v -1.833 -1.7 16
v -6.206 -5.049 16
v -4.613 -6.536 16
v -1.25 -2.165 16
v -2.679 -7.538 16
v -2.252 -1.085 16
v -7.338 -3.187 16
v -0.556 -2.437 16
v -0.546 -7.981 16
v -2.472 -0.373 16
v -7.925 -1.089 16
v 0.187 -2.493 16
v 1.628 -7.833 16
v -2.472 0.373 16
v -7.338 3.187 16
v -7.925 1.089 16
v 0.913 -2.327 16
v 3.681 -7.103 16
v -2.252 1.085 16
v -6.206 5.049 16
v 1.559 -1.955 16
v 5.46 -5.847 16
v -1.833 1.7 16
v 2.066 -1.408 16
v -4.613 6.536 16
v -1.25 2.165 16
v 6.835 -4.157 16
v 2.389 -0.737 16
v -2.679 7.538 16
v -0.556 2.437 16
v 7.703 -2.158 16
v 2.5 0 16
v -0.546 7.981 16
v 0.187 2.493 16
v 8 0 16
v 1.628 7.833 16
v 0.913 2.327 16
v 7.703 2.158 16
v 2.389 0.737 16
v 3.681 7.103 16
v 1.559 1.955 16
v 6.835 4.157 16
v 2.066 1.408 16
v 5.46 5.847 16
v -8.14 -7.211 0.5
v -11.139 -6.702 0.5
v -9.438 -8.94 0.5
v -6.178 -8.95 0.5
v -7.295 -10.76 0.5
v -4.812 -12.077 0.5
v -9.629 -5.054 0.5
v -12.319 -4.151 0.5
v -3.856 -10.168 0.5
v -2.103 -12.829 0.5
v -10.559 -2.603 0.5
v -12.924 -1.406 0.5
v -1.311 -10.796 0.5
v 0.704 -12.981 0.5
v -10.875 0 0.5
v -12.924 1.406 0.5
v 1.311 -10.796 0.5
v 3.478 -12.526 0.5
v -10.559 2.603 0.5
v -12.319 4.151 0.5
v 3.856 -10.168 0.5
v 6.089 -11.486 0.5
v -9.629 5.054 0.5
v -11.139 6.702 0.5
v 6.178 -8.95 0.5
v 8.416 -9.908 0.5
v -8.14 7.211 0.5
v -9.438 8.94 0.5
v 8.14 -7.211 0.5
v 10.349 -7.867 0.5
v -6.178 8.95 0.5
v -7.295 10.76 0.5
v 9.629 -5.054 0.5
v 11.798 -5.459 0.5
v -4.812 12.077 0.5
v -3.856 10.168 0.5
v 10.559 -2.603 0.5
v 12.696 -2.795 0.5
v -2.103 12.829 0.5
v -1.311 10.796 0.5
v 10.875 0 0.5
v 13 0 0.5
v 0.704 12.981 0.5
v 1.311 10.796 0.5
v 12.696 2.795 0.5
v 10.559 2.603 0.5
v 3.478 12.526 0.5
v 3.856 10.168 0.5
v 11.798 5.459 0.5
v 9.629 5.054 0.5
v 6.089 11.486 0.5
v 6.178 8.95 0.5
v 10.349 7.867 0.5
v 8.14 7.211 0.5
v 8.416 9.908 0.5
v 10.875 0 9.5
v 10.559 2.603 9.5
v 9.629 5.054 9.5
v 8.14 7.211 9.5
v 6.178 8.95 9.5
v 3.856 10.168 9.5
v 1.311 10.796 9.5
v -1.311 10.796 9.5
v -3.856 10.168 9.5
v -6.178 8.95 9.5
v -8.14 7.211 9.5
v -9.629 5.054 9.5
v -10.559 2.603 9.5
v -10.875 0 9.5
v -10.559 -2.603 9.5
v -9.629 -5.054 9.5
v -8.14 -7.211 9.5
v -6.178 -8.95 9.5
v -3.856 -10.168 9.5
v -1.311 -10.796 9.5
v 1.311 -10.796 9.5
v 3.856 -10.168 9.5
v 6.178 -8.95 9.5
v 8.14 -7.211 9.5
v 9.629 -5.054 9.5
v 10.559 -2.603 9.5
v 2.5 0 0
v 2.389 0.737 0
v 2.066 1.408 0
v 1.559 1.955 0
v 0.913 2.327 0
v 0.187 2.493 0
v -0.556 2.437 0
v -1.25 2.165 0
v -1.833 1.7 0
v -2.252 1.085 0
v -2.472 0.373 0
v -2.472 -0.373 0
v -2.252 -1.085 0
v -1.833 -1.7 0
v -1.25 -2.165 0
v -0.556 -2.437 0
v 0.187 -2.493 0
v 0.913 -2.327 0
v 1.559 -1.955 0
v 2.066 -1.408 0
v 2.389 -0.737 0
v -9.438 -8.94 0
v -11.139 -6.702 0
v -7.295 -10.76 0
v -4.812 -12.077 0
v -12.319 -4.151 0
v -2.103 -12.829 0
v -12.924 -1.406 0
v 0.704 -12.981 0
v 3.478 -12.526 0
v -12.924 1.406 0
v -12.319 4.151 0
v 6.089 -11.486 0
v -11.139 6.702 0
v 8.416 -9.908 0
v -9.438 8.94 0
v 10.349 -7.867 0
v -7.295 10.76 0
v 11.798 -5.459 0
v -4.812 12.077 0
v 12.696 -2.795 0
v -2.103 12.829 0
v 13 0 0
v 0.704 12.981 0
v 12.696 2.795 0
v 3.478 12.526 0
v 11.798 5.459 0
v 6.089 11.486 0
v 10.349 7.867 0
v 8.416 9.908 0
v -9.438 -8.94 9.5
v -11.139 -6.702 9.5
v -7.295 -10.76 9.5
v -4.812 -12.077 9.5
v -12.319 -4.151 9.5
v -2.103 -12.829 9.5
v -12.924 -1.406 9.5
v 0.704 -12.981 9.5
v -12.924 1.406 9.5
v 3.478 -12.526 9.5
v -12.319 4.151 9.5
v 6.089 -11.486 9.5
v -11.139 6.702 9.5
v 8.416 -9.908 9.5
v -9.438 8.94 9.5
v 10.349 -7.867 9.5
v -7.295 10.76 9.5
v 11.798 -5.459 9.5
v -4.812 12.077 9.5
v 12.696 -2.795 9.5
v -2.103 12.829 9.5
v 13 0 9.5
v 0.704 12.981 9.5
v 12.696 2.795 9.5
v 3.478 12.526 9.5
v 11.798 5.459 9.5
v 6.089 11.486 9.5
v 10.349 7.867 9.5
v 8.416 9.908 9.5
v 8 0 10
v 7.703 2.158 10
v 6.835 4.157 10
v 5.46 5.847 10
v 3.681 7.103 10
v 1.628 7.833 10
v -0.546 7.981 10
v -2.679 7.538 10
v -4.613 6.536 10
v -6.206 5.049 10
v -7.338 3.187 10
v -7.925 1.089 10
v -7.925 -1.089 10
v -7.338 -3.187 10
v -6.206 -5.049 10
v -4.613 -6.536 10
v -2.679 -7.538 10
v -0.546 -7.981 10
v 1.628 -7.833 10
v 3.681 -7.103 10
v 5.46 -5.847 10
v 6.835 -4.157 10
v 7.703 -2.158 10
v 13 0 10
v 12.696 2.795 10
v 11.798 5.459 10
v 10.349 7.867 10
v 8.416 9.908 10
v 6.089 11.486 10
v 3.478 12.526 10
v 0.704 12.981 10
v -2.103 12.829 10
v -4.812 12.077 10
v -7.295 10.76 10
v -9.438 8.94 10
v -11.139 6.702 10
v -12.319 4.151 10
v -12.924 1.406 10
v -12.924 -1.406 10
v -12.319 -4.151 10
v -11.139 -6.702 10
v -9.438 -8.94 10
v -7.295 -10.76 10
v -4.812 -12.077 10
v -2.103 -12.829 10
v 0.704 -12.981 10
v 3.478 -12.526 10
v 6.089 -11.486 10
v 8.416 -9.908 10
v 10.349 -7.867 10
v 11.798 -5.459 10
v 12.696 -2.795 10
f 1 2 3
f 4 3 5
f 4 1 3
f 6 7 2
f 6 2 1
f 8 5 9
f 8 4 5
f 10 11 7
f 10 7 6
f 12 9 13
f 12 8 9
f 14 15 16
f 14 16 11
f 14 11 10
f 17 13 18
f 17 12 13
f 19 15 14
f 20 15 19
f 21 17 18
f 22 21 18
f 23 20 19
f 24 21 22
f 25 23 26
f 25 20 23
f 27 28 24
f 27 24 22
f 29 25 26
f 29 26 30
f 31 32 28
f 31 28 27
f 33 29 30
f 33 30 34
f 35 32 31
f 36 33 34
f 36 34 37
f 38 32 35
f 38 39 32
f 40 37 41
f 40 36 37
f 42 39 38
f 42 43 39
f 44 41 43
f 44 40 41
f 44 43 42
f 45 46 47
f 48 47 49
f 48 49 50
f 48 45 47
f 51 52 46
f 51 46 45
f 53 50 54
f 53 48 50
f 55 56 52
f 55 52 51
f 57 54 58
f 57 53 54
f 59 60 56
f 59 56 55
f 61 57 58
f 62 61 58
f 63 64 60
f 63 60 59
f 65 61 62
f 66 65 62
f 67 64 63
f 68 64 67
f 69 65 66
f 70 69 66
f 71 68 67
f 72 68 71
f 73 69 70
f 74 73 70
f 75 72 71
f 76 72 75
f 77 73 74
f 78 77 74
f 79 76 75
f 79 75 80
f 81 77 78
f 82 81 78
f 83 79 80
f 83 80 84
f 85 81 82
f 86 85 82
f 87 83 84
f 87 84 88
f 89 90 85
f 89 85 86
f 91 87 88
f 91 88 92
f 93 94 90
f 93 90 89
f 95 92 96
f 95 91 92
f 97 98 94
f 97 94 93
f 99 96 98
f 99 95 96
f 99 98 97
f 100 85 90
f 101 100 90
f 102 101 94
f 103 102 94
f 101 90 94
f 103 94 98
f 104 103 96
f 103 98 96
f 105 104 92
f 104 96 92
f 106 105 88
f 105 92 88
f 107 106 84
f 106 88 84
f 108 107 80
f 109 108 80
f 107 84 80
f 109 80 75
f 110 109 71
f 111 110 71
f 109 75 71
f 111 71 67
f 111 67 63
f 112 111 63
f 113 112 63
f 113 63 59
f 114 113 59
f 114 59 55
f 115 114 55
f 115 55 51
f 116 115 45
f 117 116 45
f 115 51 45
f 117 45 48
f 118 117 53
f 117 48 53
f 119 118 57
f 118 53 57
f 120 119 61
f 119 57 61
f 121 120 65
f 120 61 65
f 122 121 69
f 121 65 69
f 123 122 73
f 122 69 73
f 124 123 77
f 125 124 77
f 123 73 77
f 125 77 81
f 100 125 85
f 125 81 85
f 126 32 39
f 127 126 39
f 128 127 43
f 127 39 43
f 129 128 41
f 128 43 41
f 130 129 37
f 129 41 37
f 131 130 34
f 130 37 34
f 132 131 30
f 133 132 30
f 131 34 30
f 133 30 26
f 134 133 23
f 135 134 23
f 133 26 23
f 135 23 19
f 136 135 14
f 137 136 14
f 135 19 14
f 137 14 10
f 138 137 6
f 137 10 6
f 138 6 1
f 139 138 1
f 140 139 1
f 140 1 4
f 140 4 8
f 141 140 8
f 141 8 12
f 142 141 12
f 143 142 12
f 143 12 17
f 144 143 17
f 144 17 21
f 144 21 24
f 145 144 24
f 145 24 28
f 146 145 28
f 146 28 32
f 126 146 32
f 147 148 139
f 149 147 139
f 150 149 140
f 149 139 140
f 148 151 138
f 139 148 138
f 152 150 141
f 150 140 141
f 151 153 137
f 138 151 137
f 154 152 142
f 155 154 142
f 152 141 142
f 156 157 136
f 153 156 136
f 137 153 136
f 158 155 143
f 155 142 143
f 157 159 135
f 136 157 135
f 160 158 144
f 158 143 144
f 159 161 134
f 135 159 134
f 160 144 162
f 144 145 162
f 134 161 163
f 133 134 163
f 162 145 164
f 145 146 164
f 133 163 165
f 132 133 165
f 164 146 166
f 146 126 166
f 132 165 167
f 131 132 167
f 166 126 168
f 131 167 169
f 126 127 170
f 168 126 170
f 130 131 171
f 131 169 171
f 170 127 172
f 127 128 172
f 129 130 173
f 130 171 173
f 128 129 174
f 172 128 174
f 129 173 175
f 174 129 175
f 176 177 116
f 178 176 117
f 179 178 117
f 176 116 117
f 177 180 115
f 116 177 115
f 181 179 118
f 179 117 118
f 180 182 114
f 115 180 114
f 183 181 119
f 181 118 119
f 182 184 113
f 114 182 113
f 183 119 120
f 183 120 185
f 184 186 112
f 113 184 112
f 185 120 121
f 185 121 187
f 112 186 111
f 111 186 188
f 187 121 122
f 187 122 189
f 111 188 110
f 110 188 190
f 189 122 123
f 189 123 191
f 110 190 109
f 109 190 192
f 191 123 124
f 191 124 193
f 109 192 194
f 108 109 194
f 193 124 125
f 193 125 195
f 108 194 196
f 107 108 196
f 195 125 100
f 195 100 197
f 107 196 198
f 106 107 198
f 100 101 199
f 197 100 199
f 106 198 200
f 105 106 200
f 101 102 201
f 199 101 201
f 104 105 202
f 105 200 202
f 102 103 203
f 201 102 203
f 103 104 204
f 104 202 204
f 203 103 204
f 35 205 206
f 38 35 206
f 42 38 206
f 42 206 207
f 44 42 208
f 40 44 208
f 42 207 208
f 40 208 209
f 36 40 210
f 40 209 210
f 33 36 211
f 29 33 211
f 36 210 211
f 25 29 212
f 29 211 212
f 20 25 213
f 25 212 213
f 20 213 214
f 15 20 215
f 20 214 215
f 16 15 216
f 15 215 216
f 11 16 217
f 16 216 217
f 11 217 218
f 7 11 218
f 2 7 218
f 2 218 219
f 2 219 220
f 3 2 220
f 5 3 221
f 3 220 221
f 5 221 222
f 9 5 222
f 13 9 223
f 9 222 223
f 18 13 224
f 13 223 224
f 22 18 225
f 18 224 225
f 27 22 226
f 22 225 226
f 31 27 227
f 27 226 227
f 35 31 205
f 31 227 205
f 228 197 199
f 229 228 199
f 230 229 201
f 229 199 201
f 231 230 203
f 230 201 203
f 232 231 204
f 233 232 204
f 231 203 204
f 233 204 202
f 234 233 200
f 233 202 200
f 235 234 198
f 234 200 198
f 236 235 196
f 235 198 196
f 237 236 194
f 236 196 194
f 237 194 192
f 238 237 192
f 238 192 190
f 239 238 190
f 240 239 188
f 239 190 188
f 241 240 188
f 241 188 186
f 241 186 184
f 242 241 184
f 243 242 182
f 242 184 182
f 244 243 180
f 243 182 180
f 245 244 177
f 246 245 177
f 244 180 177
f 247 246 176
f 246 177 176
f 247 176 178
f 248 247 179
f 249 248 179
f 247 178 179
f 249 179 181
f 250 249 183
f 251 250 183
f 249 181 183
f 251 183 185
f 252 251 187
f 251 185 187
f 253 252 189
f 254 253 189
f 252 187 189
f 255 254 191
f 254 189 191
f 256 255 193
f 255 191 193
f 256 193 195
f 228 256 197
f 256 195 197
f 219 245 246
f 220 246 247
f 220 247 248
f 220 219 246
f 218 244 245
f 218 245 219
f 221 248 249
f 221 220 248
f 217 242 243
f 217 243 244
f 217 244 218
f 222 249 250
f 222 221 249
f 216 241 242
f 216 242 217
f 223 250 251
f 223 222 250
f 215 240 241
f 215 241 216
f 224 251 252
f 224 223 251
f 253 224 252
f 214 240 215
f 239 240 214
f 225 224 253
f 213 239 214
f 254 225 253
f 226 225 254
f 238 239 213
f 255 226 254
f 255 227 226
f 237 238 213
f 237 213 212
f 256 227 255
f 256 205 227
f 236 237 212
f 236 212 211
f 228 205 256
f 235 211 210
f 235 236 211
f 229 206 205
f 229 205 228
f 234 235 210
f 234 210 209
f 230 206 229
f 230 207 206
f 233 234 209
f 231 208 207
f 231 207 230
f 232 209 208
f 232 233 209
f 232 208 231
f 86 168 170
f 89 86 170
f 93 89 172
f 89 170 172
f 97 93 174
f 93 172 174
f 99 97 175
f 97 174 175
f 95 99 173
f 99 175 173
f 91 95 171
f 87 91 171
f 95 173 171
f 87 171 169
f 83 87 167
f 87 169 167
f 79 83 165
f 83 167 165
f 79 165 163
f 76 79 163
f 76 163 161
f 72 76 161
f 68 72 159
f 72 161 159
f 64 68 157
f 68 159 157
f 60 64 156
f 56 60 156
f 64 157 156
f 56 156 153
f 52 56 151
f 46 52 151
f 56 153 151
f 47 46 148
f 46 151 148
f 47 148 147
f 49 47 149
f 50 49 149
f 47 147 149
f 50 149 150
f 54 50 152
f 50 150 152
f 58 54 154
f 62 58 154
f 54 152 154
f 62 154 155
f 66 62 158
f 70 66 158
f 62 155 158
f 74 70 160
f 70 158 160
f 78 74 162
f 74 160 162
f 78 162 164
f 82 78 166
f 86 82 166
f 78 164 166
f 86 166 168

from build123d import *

# Parameters (mm, degrees)
ESQUISSE1_R      = 13
EXTRUSION1_DEPTH = 0.5
ESQUISSE2_R      = 10.875
EXTRUSION2_DEPTH = 9
ESQUISSE3_R      = 13
EXTRUSION3_DEPTH = 0.5
ESQUISSE4_R      = 8
EXTRUSION4_DEPTH = 6
ESQUISSE5_R      = 2.5
EXTRUSION5_DEPTH = 25.372115214


with BuildPart() as part:
    # Esquisse1 → Extrusion1 (new body)
    with BuildSketch(Plane.XY):
        Circle(ESQUISSE1_R)
    extrude(amount=EXTRUSION1_DEPTH)

    # Esquisse2 → Extrusion2 (add)
    with BuildSketch(Plane.XY.offset(0.5)):
        Circle(ESQUISSE2_R)
    extrude(amount=EXTRUSION2_DEPTH)

    # Esquisse3 → Extrusion3 (add)
    with BuildSketch(Plane.XY.offset(9.5)):
        Circle(ESQUISSE3_R)
    extrude(amount=EXTRUSION3_DEPTH)

    # Esquisse4 → Extrusion4 (add)
    with BuildSketch(Plane.XY.offset(10)):
        Circle(ESQUISSE4_R)
    extrude(amount=EXTRUSION4_DEPTH)

    # Esquisse5 → Extrusion5 (cut, through all)
    with BuildSketch(Plane.XY.offset(16)):
        Circle(ESQUISSE5_R)
    extrude(amount=-EXTRUSION5_DEPTH, mode=Mode.SUBTRACT)


solid = part.part
